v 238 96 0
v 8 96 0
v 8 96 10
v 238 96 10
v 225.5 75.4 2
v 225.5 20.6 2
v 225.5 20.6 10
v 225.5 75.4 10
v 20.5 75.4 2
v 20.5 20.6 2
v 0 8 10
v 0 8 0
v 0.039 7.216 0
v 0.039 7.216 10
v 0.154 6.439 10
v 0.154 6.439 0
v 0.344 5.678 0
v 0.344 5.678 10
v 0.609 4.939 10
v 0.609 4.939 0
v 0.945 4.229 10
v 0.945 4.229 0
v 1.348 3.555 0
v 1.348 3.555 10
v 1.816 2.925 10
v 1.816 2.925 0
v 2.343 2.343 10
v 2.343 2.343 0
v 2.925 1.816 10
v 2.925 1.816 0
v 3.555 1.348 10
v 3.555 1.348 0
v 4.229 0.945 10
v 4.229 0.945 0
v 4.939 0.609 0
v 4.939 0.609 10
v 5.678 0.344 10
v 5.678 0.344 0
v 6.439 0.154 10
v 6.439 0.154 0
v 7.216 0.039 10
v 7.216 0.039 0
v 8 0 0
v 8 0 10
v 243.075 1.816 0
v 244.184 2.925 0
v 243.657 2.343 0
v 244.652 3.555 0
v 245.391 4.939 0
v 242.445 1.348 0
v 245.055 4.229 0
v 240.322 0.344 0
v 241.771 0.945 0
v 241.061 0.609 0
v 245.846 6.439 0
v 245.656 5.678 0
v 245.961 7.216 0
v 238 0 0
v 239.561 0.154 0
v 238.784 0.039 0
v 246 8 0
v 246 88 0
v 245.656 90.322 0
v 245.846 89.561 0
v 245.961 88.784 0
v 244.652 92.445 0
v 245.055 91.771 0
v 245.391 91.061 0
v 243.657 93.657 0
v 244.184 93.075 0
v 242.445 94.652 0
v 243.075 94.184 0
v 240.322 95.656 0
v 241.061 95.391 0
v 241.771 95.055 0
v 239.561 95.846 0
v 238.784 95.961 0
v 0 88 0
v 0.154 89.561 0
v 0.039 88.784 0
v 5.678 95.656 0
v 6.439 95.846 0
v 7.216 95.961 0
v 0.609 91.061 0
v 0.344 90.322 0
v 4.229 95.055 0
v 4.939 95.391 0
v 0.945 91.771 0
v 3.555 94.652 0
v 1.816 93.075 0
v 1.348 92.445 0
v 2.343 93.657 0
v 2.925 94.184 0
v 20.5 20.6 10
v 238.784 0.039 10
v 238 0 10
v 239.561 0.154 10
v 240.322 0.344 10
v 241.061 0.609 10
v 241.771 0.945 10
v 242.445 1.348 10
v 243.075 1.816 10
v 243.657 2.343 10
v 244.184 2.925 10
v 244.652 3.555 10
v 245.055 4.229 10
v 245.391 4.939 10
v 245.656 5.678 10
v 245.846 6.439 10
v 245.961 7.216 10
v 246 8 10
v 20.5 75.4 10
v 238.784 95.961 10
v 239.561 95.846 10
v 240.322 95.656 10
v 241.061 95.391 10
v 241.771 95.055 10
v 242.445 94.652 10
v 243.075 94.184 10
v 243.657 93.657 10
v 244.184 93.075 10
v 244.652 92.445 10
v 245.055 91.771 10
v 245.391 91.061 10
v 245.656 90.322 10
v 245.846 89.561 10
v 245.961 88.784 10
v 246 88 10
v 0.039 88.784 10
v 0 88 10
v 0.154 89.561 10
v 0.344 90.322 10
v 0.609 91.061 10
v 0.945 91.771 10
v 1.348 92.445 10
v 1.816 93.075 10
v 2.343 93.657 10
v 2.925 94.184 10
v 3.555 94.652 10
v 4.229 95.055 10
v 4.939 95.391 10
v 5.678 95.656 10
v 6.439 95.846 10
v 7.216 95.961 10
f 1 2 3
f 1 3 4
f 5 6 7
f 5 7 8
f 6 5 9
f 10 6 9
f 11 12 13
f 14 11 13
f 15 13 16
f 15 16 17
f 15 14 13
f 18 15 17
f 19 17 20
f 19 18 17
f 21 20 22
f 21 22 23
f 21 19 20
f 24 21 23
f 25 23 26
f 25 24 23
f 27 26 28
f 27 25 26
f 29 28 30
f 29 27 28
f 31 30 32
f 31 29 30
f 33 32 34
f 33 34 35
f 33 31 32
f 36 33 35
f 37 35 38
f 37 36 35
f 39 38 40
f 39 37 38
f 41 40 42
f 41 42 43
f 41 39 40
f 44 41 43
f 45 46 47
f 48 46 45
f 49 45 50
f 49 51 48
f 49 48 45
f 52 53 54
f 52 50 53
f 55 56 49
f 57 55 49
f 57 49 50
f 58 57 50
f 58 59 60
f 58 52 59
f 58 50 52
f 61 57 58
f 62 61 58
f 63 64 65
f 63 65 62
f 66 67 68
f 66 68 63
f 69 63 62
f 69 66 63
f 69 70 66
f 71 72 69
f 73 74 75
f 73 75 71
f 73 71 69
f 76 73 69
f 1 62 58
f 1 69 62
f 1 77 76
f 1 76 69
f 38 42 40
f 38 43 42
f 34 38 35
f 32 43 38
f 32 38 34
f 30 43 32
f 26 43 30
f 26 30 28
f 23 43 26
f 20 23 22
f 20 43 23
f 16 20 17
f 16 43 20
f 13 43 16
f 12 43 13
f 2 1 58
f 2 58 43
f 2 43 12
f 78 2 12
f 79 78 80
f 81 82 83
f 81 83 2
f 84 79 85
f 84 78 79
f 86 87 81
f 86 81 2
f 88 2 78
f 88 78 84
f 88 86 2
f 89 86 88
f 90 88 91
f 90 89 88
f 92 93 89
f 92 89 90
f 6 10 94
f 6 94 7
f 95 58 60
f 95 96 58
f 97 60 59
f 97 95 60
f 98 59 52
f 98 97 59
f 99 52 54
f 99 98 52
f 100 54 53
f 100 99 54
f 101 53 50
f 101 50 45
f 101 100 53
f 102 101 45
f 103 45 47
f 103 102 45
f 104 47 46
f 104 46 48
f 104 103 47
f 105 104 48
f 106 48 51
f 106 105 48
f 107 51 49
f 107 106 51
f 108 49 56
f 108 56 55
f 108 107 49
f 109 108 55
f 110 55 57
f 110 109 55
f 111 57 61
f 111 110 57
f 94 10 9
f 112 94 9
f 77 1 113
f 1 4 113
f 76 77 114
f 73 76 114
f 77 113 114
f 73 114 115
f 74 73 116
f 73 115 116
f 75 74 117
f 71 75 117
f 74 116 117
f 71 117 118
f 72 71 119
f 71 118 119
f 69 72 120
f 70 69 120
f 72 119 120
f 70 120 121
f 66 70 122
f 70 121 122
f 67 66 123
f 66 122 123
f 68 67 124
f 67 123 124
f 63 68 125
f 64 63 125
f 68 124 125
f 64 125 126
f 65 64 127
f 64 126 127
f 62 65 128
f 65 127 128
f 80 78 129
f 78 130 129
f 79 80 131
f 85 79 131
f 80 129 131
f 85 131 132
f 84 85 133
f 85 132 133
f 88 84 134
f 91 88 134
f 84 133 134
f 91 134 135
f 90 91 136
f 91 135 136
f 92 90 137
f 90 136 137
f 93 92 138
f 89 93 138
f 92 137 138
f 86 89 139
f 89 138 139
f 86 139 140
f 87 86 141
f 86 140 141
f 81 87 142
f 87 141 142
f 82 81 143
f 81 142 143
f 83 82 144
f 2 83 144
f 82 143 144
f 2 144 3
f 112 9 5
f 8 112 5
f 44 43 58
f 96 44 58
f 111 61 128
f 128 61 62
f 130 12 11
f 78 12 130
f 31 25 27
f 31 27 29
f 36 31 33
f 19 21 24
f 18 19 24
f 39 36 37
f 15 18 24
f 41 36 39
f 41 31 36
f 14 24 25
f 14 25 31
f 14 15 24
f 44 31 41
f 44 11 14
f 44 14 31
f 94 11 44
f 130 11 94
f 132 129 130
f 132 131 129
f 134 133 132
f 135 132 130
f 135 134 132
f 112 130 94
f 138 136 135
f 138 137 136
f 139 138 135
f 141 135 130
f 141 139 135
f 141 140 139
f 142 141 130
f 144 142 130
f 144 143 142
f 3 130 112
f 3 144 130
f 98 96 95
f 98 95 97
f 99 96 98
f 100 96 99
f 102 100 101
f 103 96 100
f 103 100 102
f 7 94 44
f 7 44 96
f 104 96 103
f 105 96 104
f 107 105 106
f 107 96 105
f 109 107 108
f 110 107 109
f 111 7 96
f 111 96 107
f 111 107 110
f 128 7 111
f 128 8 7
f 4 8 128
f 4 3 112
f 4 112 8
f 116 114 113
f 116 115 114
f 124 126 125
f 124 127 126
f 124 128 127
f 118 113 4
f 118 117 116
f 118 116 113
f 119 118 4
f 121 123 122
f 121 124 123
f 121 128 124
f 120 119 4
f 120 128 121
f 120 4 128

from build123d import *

# Parameters (mm, degrees)
ESQUISSE2_W        = 246
ESQUISSE2_H        = 96
ESQUISSE2_W_2      = 205
ESQUISSE2_H_2      = 54.8
BOSS_EXTRU_1_DEPTH = 10
CONG_1_R           = 8
ESQUISSE3_W        = 205
ESQUISSE3_H        = 54.8
BOSS_EXTRU_2_DEPTH = 2


with BuildPart() as part:
    # Esquisse2 → Boss.-Extru.1 (new body)
    with BuildSketch(Plane.XY):
        with Locations((123, 48)):
            Rectangle(ESQUISSE2_W, ESQUISSE2_H)
        with Locations((123, 48)):
            Rectangle(ESQUISSE2_W_2, ESQUISSE2_H_2, mode=Mode.SUBTRACT)
    extrude(amount=BOSS_EXTRU_1_DEPTH)

    # Congé1
    cong_1_edges = [part.edges().sort_by_distance(p)[0] for p in [
        (0, 96, 5),
        (246, 96, 5),
        (246, 0, 5),
        (0, 0, 5),
    ]]
    fillet(cong_1_edges, radius=CONG_1_R)

    # Esquisse3 → Boss.-Extru.2 (add)
    with BuildSketch(Plane(origin=(0, 0, 0), x_dir=(-1, 0, 0), z_dir=(0, 0, -1))):
        with Locations((-123, 48)):
            Rectangle(ESQUISSE3_W, ESQUISSE3_H)
    extrude(amount=-BOSS_EXTRU_2_DEPTH)


solid = part.part
